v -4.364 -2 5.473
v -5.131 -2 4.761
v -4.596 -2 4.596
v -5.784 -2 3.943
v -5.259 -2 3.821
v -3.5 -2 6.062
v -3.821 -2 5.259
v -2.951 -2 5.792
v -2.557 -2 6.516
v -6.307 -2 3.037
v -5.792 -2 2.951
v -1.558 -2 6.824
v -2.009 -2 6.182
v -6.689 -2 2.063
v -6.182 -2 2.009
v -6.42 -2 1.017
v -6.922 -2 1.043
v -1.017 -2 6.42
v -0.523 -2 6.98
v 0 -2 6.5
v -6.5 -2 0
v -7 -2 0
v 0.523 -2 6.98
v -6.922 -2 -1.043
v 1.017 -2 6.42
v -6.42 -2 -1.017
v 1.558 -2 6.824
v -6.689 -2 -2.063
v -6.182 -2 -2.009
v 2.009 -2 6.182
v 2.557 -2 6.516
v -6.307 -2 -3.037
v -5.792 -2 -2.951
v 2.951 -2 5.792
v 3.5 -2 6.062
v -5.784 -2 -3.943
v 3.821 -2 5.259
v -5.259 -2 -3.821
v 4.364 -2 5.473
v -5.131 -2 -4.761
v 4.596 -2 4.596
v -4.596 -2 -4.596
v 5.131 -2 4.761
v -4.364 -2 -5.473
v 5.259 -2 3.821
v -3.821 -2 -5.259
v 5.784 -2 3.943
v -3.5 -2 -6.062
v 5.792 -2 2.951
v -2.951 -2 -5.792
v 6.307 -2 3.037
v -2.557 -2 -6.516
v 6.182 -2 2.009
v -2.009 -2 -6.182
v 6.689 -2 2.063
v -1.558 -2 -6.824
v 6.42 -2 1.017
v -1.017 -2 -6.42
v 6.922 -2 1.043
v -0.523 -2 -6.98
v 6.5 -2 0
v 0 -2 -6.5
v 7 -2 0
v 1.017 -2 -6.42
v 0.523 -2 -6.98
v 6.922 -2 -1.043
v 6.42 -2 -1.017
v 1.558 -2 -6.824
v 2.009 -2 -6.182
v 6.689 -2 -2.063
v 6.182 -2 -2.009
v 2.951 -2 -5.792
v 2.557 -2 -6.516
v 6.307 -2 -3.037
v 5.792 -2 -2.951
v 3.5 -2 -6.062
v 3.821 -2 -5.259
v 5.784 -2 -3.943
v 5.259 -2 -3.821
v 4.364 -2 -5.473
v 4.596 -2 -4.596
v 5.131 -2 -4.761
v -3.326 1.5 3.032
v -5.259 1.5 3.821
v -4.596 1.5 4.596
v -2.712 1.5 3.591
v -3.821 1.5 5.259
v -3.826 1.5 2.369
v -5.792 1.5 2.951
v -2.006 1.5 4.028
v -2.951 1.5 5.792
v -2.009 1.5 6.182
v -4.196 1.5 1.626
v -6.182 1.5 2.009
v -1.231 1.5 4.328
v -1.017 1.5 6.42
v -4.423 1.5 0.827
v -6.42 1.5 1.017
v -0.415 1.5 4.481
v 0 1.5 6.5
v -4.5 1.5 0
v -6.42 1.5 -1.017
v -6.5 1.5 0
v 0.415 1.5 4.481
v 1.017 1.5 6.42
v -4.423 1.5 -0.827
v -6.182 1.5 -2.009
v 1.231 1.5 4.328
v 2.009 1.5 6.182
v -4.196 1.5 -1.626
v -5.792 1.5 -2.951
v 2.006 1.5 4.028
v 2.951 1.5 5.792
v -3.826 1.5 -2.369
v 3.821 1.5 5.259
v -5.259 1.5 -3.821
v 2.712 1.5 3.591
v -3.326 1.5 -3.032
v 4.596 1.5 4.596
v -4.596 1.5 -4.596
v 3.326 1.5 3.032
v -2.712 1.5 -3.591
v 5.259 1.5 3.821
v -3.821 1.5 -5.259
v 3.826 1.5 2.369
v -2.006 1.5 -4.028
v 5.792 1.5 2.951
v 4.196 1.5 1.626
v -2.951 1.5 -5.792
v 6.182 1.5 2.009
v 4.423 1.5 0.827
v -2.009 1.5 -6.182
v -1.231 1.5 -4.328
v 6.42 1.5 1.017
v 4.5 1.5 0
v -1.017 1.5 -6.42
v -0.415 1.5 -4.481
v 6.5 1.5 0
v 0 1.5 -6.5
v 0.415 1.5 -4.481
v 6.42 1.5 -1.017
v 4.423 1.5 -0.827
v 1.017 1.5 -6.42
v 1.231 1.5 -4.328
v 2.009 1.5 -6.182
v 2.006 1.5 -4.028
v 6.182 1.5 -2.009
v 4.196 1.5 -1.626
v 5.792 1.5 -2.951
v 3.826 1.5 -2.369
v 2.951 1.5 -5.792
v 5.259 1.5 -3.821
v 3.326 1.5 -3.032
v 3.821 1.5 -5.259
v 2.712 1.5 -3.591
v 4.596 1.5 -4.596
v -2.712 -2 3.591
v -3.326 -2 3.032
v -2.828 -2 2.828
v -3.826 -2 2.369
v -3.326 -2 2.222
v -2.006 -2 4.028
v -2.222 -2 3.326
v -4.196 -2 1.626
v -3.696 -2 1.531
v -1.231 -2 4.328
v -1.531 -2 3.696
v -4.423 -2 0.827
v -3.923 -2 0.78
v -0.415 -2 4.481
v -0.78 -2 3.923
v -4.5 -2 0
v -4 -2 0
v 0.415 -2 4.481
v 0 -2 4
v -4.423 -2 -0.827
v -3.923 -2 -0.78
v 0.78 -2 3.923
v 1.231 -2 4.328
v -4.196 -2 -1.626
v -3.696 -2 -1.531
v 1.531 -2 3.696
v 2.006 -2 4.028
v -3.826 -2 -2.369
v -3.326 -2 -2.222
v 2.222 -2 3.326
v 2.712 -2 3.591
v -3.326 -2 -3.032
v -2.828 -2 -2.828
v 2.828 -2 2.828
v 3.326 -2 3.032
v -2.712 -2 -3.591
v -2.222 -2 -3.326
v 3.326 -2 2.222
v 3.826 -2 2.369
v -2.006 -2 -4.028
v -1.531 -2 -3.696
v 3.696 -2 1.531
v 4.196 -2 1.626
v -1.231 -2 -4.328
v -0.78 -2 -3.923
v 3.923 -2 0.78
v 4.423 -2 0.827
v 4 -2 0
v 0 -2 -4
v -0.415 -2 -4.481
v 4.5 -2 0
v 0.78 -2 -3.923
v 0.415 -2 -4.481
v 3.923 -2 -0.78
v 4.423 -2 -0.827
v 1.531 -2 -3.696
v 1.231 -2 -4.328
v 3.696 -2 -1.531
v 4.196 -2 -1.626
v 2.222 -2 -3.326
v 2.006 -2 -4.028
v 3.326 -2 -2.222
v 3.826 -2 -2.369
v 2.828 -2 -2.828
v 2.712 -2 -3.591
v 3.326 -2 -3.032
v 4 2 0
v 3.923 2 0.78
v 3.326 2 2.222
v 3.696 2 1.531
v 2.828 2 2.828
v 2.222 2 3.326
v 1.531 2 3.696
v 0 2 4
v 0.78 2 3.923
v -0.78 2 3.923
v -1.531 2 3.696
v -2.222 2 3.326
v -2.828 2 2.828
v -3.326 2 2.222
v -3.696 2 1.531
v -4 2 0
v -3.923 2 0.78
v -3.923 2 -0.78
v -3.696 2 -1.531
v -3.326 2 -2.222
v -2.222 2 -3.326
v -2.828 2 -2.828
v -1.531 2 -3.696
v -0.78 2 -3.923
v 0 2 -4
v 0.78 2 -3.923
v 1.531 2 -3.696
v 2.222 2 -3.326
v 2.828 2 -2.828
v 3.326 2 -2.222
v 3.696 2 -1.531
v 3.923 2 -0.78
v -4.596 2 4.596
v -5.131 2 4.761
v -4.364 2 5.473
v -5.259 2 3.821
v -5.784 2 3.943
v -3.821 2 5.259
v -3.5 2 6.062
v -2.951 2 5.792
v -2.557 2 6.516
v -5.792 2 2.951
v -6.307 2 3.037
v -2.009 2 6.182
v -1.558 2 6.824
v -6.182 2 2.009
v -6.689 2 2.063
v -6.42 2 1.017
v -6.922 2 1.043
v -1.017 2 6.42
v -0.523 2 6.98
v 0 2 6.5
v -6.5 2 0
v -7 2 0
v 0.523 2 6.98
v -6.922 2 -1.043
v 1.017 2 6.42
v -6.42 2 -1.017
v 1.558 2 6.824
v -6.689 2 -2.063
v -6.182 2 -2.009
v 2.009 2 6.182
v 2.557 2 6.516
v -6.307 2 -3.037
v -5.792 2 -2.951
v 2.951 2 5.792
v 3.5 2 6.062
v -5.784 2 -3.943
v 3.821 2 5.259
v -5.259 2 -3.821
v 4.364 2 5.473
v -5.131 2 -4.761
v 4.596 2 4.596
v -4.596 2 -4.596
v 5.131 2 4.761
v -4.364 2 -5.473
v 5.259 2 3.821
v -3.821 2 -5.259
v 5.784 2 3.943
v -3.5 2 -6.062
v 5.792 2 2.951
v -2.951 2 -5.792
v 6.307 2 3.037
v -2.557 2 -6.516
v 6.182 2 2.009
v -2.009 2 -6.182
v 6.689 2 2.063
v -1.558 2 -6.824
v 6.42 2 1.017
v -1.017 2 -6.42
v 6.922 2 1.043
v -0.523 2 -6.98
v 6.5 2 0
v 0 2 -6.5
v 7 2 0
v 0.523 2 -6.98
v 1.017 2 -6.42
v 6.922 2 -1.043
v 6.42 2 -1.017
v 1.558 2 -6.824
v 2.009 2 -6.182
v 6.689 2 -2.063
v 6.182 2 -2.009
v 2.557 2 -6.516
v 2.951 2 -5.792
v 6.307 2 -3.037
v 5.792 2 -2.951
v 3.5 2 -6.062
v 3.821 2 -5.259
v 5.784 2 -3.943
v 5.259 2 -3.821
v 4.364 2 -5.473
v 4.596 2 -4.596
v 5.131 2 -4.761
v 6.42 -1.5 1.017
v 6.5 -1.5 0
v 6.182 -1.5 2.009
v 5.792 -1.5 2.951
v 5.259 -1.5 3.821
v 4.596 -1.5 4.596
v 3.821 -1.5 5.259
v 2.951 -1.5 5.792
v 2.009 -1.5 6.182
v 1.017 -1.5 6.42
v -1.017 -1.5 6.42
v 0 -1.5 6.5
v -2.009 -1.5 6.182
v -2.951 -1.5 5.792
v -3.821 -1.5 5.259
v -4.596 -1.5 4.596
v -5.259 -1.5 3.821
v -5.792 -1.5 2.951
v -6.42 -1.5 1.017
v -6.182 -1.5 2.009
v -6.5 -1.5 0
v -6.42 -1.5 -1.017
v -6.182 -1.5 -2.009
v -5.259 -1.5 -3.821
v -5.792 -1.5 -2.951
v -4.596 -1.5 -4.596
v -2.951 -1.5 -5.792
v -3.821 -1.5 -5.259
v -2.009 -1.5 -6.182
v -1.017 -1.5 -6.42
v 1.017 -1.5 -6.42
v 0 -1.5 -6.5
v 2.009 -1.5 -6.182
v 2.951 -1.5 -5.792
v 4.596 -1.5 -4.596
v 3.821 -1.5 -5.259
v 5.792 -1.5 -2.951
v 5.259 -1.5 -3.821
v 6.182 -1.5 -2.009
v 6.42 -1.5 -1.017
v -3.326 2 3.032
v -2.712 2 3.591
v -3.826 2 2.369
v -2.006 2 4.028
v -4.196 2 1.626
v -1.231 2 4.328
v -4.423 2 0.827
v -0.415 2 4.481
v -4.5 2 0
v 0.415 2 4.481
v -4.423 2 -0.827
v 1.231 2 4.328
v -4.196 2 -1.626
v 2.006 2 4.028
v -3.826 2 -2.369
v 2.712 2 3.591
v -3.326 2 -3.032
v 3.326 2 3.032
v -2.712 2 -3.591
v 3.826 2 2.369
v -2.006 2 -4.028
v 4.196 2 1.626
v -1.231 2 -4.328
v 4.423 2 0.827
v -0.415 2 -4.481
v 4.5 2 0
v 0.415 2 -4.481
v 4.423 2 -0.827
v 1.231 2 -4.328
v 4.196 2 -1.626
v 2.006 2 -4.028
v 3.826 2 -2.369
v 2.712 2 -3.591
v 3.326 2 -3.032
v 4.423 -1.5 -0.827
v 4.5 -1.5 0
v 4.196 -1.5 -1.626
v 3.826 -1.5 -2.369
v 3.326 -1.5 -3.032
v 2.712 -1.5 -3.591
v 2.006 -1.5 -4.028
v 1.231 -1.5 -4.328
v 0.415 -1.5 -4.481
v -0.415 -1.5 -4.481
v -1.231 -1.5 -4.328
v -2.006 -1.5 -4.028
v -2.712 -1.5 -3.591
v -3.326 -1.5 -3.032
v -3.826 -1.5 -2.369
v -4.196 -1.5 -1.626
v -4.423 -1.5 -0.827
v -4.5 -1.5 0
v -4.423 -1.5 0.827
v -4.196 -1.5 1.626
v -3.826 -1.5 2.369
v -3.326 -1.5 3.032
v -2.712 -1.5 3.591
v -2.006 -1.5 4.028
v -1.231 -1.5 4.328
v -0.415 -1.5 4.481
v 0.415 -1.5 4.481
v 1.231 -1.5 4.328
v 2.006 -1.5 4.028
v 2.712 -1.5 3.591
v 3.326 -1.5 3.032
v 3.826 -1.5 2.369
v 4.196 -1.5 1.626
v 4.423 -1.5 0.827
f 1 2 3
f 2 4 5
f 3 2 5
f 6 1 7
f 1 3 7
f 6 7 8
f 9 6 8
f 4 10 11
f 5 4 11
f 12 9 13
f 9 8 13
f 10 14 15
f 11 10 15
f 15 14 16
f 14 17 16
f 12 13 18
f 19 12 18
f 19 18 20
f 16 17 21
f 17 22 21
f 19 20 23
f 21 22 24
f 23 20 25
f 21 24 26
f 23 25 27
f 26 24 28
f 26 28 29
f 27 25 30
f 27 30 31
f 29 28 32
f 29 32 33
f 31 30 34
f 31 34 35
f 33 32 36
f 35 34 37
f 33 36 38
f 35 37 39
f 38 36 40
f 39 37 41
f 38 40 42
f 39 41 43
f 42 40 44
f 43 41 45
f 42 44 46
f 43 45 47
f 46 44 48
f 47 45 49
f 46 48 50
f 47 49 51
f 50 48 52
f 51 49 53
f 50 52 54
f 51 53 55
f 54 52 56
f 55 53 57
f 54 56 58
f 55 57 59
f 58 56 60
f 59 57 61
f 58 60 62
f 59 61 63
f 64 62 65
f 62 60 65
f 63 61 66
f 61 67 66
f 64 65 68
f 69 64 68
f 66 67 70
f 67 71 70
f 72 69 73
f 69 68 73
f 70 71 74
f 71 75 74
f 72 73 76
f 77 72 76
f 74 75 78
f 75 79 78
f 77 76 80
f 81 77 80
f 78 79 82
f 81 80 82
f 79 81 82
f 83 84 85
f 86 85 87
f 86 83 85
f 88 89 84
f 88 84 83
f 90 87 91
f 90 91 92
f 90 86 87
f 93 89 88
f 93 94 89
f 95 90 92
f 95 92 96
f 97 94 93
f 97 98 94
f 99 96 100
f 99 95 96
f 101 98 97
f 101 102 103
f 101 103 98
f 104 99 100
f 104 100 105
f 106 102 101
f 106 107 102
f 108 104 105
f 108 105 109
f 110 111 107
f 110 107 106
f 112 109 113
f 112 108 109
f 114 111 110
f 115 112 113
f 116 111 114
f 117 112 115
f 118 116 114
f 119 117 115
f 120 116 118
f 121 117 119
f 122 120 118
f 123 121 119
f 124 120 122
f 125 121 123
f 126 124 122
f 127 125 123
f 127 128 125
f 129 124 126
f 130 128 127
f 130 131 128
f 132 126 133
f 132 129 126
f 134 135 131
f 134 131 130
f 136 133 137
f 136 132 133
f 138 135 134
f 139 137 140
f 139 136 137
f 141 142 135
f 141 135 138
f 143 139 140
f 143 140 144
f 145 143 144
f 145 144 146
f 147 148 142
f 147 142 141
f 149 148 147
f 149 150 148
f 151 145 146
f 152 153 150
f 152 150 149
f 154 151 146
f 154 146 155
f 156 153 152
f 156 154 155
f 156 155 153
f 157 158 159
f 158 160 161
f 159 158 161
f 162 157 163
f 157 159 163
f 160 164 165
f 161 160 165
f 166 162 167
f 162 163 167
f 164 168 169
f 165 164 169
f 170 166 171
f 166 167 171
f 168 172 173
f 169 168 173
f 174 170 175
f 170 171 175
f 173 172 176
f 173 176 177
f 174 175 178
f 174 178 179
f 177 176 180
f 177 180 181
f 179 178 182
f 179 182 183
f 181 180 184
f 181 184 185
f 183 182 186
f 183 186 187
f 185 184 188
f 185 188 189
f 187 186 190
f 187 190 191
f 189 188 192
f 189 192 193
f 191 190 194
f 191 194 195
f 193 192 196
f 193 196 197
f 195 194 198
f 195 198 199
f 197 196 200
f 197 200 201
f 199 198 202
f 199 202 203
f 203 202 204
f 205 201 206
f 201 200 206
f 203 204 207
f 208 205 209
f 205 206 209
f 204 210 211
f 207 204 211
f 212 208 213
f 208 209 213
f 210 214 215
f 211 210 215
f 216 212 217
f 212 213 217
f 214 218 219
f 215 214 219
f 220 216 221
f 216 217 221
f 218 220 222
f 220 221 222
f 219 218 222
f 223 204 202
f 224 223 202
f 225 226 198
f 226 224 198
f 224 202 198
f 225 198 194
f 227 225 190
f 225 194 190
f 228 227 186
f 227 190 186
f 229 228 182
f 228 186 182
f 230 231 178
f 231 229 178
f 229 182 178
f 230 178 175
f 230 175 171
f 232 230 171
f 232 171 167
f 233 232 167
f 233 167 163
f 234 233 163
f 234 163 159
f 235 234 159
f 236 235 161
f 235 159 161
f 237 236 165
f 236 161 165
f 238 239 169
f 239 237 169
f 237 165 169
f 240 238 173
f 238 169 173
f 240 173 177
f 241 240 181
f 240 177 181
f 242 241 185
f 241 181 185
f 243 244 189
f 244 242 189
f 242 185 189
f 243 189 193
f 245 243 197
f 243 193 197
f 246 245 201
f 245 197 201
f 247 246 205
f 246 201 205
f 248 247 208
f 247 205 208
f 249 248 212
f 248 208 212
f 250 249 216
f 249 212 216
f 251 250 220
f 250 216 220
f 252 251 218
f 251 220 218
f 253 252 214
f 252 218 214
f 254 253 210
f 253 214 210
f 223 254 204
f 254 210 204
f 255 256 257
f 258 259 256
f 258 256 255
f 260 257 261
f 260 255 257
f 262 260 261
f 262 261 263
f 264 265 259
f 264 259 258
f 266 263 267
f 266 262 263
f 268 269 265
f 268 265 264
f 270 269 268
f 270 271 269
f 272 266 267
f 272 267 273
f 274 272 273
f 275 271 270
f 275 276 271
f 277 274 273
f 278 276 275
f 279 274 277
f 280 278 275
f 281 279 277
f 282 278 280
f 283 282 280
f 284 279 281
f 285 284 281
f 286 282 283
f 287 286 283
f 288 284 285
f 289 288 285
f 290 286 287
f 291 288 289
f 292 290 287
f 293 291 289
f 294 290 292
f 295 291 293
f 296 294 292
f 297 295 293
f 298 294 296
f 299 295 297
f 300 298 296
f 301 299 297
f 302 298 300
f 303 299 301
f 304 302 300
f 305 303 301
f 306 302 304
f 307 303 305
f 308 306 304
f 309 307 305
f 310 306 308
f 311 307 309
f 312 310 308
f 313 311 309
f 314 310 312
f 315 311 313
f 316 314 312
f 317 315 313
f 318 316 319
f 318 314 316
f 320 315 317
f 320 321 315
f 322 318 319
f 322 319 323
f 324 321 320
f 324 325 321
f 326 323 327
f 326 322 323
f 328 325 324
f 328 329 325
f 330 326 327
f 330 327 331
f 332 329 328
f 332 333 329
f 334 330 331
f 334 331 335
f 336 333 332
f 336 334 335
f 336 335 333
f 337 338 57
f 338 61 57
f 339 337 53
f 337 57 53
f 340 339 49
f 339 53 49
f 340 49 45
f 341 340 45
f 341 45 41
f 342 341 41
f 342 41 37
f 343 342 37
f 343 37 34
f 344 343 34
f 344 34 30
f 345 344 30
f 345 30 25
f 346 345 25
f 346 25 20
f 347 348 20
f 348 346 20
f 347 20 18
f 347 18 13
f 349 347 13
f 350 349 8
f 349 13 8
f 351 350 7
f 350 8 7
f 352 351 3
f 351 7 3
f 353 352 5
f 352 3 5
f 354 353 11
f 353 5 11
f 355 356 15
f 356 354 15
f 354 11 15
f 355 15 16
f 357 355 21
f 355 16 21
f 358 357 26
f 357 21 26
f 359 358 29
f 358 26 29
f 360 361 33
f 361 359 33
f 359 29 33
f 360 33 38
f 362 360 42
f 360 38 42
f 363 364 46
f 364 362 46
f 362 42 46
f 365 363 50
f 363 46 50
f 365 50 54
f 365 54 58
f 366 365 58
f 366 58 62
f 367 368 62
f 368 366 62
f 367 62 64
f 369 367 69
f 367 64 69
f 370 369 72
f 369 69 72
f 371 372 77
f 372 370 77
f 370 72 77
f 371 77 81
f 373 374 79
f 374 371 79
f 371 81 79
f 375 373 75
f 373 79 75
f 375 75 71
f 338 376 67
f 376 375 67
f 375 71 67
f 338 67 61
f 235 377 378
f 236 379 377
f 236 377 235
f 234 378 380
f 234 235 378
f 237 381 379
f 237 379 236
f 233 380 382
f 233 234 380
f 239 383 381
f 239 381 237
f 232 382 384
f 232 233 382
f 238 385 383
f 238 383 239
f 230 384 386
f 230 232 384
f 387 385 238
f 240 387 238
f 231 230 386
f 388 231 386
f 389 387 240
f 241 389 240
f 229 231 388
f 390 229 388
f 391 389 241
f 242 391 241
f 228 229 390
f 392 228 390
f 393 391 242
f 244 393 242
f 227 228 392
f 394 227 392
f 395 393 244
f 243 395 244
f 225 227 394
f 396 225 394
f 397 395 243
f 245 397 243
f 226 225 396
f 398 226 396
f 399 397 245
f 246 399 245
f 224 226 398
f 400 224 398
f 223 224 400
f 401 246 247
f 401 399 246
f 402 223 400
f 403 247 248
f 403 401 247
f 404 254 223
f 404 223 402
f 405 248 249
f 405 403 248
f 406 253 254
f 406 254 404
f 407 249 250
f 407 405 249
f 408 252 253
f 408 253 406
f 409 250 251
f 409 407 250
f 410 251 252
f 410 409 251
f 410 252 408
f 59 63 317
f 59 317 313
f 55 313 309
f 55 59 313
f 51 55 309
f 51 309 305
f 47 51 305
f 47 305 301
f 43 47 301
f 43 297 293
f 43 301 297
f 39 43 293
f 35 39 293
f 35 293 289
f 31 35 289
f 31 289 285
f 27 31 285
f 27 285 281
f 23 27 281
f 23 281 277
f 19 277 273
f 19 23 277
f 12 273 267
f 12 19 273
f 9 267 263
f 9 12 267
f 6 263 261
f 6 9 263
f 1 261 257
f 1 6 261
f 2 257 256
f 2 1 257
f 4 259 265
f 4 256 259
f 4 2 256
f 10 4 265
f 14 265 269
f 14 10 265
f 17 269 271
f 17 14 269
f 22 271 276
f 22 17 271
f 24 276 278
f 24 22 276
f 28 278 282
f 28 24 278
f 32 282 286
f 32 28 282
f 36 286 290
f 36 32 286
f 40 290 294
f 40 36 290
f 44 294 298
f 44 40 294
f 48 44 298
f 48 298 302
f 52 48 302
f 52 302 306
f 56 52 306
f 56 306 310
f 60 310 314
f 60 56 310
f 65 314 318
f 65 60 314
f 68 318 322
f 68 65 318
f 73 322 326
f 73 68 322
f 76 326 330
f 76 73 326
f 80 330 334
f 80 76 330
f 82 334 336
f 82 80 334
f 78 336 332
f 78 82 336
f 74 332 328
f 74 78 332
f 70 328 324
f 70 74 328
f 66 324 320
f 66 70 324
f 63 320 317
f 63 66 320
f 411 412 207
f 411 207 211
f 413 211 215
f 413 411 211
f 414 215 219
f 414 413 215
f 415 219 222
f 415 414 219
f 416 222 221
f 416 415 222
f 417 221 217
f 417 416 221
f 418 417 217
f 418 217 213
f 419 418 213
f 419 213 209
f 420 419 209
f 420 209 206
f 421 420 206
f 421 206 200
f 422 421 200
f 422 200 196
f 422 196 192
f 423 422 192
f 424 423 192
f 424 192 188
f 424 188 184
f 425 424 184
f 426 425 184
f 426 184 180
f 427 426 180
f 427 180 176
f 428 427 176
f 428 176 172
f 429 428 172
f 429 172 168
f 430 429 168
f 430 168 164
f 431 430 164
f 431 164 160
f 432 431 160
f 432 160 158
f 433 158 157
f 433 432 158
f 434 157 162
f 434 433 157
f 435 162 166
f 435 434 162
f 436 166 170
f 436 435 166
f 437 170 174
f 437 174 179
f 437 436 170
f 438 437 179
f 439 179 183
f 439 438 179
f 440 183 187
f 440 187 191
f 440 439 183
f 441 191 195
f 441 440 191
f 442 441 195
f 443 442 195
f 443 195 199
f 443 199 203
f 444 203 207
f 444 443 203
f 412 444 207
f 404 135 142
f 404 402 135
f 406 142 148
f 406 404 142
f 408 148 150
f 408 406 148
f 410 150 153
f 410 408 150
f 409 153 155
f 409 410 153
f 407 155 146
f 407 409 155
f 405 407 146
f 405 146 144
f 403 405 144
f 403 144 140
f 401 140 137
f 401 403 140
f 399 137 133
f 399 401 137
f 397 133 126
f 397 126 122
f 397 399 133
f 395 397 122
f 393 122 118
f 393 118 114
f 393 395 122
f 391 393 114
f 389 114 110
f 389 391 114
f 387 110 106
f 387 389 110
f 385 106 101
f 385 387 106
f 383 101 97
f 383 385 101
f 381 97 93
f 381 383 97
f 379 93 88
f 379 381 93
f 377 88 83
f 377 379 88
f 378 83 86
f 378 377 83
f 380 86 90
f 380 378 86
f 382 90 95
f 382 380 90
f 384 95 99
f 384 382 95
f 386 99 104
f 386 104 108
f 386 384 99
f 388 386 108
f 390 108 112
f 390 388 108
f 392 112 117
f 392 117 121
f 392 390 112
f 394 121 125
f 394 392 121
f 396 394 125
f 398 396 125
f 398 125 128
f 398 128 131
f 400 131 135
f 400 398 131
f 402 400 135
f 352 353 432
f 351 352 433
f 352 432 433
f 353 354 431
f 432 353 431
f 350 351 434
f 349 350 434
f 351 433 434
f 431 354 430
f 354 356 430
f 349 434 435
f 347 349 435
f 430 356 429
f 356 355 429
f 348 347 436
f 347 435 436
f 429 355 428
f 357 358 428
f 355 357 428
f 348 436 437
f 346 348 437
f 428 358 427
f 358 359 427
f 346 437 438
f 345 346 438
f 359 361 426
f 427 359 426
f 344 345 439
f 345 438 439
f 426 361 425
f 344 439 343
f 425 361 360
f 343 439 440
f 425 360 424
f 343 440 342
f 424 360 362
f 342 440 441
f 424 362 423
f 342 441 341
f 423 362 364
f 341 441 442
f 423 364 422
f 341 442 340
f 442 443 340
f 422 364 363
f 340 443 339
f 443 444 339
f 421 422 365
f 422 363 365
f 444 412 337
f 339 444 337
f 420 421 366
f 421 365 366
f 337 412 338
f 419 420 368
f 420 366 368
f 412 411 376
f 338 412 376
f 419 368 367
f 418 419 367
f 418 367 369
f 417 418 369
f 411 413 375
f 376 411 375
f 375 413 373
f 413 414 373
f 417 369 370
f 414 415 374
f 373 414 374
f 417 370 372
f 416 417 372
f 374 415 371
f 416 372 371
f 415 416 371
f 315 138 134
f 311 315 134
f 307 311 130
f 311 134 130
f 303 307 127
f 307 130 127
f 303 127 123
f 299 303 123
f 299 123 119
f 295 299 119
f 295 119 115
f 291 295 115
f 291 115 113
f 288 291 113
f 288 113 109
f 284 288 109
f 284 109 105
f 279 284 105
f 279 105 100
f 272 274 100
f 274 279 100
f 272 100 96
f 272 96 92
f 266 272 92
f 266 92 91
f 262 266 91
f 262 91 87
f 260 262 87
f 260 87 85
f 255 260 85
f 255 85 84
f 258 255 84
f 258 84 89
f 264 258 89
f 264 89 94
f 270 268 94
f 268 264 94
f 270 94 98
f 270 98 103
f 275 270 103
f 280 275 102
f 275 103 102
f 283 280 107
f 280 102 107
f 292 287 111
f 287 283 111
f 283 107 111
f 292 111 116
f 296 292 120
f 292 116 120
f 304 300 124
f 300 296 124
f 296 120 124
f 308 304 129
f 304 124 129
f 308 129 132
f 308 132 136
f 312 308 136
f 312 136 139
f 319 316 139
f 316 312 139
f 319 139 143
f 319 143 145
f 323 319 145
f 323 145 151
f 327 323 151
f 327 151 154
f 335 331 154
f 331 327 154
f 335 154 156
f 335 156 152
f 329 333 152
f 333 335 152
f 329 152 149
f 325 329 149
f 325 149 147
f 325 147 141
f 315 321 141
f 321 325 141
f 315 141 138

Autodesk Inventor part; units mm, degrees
ref_plane "YZ Plane" through (0, 0, 0) normal (1, 0, 0) x (0, 1, 0)
ref_plane "XZ Plane" through (0, 0, 0) normal (0, 1, 0) x (-1, 0, 0)
ref_plane "XY Plane" through (0, 0, 0) normal (0, 0, 1) x (1, 0, 0)
sketch "Эскиз1" plane through (0, 0, 0) normal (0, 0, 1) x (1, 0, 0)
  line L0 (7, -2) -> (-7, -2)
  line L1 (-7, -2) -> (-7, 2)
  line L2 (-7, 2) -> (7, 2)
  line L3 (7, 2) -> (7, -2)
  line L4 (7, -2) -> (-7, 2) construction
  line L5 (-7, -2) -> (7, 2) construction
  line L6 (4, -2) -> (-4, -2)
  line L7 (-4, -2) -> (-4, 2)
  line L8 (-4, 2) -> (4, 2)
  line L9 (4, 2) -> (4, -2)
  line L10 (4, -2) -> (-4, 2) construction
  line L11 (-4, -2) -> (4, 2) construction
  line L12 (6.5, -1.5) -> (4.5, -1.5)
  line L13 (4.5, -2) -> (4.5, 2)
  line L14 (4.5, 1.5) -> (6.5, 1.5)
  line L15 (6.5, 2) -> (6.5, -2)
  line L16 (6.5, -1.5) -> (4.5, 1.5) construction
  line L17 (4.5, -1.5) -> (6.5, 1.5) construction
  line L18 (0, -2) -> (0, 2) construction
  point P0 (0, 0)
  point P1 (5.5, 0)
  dimension "d1" = 14
  dimension "d2" = 8
  dimension "d3" = 4
  dimension "d4" = 0.5
  dimension "d5" = 0.5
  dimension "d6" = 0.5
  dimension "d7" = 0.5
revolve "Вращение1" add sketch "Эскиз1" angle 360 about axis through (0, -2, 0) along (0, 1, 0) contours L0 L15 L2 L3 | L0 L9 L2 L13 | L12 L13 L14 L15
equation "\"d4\" = d6"
equation "\"d6\" = d7"
equation "\"d7\" = d5"
properties part number "Подшипник 8х14х4"
